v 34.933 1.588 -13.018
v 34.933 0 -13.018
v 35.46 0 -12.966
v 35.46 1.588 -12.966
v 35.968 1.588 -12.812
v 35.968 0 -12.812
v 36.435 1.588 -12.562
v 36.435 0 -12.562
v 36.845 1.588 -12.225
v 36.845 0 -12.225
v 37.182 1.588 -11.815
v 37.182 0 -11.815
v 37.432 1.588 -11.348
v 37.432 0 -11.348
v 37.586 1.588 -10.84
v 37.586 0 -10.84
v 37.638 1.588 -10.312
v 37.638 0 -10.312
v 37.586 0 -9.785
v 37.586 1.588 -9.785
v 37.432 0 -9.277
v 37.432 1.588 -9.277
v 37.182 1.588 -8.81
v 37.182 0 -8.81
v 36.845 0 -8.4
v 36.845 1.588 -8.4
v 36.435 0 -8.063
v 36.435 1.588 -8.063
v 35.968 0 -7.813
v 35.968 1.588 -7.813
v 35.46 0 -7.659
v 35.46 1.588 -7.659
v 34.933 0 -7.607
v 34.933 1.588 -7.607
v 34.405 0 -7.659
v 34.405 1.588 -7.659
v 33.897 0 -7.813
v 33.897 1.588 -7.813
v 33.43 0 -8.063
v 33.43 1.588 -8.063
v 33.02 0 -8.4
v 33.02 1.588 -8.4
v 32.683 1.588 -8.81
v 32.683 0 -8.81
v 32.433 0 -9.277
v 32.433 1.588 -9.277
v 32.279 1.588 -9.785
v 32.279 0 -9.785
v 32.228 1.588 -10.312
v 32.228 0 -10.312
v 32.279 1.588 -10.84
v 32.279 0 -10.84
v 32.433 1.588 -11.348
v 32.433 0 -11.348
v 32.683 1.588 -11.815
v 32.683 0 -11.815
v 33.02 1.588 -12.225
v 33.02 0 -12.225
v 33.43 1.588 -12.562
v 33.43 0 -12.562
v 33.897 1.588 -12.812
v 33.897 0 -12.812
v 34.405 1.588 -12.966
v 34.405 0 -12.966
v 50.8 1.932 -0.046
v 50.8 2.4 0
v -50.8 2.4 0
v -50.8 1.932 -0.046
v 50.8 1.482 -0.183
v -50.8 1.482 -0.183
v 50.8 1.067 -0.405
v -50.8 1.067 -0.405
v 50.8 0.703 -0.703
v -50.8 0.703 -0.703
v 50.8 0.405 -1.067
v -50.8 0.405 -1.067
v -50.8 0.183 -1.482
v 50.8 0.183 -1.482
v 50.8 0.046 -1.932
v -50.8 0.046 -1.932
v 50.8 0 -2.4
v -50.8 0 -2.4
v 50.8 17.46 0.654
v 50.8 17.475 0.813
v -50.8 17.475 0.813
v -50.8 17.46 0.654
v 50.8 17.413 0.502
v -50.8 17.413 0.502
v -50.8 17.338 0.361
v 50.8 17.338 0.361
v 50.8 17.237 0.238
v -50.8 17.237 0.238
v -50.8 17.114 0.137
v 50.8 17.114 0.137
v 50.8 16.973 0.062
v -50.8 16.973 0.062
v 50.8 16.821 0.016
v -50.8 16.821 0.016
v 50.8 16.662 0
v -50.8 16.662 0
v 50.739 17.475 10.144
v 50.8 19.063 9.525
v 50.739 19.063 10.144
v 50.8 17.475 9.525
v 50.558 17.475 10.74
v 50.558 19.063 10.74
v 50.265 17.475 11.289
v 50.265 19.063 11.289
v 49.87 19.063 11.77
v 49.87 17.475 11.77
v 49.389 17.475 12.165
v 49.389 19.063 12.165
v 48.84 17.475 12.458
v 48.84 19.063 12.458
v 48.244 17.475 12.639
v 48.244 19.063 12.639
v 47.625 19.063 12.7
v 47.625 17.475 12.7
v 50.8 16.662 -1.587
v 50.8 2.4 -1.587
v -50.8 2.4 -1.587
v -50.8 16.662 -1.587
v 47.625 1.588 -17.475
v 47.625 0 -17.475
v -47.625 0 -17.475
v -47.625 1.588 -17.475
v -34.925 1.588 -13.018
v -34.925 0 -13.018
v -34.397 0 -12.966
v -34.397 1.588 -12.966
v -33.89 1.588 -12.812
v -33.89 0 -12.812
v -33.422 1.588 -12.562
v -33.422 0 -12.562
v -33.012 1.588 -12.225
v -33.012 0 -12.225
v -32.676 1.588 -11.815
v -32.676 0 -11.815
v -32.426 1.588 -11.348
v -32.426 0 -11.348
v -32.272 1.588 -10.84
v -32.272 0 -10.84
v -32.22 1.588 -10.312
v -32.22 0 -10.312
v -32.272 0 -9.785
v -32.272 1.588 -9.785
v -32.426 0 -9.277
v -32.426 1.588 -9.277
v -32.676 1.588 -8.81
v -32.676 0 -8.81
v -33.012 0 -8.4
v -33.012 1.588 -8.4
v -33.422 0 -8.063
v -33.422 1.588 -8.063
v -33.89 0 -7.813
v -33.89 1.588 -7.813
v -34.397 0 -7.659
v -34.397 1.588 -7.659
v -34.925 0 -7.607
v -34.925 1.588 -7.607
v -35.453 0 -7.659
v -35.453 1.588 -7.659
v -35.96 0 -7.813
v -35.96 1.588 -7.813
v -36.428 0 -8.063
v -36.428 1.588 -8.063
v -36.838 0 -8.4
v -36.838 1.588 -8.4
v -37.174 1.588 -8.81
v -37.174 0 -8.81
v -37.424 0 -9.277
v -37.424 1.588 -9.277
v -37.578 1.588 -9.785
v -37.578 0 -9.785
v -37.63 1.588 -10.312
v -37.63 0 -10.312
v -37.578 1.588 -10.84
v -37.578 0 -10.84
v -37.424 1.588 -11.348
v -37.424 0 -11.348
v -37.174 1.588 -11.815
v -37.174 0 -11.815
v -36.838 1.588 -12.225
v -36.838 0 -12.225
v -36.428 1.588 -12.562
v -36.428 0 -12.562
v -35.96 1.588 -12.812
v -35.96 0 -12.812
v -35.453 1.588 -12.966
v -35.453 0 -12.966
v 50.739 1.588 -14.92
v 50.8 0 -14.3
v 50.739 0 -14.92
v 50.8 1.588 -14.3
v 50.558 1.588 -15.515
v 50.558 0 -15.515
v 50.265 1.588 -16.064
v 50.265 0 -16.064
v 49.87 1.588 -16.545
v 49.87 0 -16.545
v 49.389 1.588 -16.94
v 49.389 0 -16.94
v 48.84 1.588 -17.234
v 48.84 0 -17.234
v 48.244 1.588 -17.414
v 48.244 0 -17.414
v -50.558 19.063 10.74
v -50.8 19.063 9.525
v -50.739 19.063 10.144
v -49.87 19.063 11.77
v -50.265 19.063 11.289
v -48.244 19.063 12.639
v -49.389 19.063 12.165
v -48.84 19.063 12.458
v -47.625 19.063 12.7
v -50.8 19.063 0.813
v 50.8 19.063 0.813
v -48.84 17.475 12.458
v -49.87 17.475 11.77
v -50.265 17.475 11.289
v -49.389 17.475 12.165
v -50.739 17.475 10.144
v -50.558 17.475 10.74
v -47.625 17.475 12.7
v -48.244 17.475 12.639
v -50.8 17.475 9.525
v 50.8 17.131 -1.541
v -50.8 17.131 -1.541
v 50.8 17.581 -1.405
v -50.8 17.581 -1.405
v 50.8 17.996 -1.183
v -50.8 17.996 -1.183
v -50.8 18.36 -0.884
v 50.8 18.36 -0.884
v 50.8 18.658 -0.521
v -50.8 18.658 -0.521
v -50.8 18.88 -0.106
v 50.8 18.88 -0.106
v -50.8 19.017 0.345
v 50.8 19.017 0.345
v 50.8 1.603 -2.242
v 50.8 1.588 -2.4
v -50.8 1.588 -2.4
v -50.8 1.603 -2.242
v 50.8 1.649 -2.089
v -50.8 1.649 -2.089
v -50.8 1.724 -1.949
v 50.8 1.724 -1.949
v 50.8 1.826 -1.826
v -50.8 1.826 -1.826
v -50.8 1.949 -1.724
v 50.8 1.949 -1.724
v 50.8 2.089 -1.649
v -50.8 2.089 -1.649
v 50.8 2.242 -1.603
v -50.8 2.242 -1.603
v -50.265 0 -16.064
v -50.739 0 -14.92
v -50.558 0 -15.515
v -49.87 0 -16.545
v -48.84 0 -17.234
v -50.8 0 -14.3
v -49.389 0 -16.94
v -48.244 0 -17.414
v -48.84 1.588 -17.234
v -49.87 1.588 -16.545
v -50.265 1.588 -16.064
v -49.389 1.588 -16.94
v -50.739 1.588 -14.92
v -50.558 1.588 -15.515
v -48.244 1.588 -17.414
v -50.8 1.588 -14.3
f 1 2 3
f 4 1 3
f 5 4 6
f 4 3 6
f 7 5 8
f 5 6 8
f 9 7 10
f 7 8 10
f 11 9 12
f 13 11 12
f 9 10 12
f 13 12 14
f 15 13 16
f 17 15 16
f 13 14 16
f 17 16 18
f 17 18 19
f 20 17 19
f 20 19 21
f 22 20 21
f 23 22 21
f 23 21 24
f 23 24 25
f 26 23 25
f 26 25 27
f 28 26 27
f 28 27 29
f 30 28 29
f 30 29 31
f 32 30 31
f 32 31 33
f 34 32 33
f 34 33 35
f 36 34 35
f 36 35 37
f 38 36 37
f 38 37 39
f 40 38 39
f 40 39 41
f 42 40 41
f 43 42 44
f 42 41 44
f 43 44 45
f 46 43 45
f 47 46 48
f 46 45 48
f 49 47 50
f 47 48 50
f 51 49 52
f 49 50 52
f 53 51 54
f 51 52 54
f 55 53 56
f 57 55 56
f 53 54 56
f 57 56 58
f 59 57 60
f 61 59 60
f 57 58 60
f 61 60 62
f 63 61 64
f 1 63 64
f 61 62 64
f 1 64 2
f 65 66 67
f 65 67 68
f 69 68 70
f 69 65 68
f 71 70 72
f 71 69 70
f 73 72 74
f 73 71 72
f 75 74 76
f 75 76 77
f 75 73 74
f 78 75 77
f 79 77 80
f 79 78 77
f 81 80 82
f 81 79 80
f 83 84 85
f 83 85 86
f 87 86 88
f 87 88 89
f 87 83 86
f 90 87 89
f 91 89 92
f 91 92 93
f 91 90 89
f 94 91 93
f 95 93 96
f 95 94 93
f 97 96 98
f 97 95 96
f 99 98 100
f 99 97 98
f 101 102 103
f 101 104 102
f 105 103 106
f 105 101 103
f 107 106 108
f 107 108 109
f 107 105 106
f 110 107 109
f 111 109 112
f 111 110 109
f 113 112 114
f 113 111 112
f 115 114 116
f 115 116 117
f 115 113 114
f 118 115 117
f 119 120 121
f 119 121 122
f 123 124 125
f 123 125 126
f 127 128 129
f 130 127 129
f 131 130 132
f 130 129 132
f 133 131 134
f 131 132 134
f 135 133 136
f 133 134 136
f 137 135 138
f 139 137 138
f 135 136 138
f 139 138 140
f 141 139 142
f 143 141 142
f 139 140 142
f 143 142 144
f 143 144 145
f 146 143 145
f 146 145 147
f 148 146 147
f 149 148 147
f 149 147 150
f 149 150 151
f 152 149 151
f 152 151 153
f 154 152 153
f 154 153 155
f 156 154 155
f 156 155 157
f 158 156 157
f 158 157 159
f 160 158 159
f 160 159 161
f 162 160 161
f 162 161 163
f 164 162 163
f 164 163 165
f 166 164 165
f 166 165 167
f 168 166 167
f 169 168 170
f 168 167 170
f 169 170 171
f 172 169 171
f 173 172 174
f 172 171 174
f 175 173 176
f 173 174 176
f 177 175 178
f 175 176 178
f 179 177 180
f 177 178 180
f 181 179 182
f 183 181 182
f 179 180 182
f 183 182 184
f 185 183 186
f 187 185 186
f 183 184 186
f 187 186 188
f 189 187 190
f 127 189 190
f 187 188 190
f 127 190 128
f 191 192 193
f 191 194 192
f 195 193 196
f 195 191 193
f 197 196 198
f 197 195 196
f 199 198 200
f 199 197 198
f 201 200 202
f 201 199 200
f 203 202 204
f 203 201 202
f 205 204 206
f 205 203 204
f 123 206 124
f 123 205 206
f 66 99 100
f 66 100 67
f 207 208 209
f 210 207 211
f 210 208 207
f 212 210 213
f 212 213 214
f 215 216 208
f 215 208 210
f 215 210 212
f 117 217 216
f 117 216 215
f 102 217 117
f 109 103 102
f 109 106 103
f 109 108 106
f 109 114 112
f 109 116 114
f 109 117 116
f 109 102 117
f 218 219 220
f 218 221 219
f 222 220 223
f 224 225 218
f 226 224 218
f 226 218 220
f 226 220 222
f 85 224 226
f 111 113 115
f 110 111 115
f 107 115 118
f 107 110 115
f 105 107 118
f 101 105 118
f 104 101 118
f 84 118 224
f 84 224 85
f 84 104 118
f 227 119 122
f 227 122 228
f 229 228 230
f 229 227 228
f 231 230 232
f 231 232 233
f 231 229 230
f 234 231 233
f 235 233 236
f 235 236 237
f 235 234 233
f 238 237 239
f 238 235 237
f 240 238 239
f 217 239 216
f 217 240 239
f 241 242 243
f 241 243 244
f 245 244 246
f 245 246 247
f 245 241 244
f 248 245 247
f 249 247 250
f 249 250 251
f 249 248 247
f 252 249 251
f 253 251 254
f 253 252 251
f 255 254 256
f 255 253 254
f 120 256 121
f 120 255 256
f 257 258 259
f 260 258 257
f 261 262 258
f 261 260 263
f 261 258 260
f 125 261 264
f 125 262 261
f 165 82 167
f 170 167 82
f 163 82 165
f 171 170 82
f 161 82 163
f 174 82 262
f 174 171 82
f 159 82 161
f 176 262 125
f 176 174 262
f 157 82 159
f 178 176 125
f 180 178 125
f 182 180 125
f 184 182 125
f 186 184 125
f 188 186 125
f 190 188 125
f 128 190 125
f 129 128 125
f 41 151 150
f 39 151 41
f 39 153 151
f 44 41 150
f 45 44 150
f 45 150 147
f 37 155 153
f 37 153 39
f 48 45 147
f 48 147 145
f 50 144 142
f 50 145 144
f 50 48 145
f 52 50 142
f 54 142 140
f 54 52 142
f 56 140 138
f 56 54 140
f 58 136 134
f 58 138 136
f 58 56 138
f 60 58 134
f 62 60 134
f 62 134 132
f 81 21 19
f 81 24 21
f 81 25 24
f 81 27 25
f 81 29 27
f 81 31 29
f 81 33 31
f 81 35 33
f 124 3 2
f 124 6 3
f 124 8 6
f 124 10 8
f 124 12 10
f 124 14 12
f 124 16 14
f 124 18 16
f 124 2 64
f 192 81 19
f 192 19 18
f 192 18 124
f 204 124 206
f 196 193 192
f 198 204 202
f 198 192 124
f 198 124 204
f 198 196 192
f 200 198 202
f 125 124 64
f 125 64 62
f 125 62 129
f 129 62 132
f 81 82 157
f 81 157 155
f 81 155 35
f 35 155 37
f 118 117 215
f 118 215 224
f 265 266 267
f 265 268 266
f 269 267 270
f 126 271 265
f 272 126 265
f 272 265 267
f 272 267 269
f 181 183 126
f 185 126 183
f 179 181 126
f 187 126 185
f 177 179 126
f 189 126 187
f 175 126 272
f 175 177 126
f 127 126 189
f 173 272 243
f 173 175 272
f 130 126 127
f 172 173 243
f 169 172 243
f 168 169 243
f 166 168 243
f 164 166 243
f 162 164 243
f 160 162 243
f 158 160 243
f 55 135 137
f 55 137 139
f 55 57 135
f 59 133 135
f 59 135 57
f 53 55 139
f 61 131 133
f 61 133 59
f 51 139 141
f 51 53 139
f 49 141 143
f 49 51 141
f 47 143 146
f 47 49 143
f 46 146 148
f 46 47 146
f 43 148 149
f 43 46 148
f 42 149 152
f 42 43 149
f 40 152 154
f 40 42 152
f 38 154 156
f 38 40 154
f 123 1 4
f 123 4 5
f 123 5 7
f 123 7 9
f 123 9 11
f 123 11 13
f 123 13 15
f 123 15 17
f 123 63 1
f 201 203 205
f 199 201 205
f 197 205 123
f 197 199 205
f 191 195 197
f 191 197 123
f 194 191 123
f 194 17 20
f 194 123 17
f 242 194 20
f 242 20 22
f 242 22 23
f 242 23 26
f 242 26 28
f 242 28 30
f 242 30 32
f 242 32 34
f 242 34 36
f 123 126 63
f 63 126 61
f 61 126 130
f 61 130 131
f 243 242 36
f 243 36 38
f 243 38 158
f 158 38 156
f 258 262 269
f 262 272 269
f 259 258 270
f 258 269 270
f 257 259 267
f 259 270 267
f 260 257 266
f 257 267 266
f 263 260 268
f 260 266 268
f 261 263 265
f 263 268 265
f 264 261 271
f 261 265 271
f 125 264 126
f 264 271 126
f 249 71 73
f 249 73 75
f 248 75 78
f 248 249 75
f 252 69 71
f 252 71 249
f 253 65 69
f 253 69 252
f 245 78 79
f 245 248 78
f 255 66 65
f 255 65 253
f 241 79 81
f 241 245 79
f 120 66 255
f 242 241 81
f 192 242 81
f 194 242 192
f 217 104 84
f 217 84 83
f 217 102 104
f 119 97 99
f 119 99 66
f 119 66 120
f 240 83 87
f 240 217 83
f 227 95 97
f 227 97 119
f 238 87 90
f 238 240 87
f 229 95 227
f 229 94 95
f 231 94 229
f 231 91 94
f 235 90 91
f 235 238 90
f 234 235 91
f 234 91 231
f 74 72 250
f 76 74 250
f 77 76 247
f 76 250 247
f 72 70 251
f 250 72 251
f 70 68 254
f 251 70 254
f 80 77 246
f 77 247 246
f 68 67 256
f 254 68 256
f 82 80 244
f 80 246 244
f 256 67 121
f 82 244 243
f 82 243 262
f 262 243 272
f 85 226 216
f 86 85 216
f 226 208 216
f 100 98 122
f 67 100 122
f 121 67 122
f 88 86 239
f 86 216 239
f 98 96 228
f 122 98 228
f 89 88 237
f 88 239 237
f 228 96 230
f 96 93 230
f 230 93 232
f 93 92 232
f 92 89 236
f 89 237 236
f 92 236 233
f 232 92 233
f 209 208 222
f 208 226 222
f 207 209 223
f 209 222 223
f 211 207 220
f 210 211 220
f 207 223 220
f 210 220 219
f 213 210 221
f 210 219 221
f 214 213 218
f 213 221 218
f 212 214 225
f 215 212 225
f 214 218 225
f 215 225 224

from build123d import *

# Parameters (mm, degrees)
BASE_FLANGE1_DEPTH = 50.8
SKETCH4_R          = 2.7051
CUT_EXTRUDE1_DEPTH = 2.54
FILLET1_R          = 3.175


# Sheet-metal steps are written as plain solids
with BuildPart() as part:
    # Sketch1 → Base-Flange1 (new, symmetric)
    with BuildSketch(Plane(origin=(0, 0, 0), x_dir=(0, 0, -1), z_dir=(1, 0, 0))):
        with BuildLine():
            Line((-12.7, 17.4752), (-0.8128, 17.4752))
            ThreePointArc((-0.8128, 17.4752), (-0.238063608, 17.237136392), (0, 16.6624))
            Line((0, 16.6624), (0, 2.4003))
            ThreePointArc((0, 2.4003), (0.703031593, 0.703031593), (2.4003, 0))
            Line((2.4003, 0), (17.4752, 0))
            Line((17.4752, 0), (17.4752, 1.5875))
            Line((17.4752, 1.5875), (2.4003, 1.5875))
            ThreePointArc((2.4003, 1.5875), (1.825563608, 1.825563608), (1.5875, 2.4003))
            Line((1.5875, 2.4003), (1.5875, 16.6624))
            ThreePointArc((1.5875, 16.6624), (0.884468407, 18.359668407), (-0.8128, 19.0627))
            Line((-0.8128, 19.0627), (-12.7, 19.0627))
            Line((-12.7, 19.0627), (-12.7, 17.4752))
        make_face()
    extrude(amount=BASE_FLANGE1_DEPTH, both=True)

    # Sketch4 → Cut-Extrude1 (cut)
    with BuildSketch(Plane.XZ):
        with Locations(Location((34.93262, -10.3124, 0), (0, 0, 270))):
            Circle(SKETCH4_R)
        with Locations(Location((-34.925, -10.3124, 0), (0, 0, 270))):
            Circle(SKETCH4_R)
    extrude(amount=-CUT_EXTRUDE1_DEPTH, mode=Mode.SUBTRACT)

    # Fillet1
    fillet1_edges = [part.edges().sort_by_distance(p)[0] for p in [
        (-50.8, 0.79375, -17.4752),
        (-50.8, 18.26895, 12.7),
        (50.8, 0.79375, -17.4752),
        (50.8, 18.26895, 12.7),
    ]]
    fillet(fillet1_edges, radius=FILLET1_R)


solid = part.part
